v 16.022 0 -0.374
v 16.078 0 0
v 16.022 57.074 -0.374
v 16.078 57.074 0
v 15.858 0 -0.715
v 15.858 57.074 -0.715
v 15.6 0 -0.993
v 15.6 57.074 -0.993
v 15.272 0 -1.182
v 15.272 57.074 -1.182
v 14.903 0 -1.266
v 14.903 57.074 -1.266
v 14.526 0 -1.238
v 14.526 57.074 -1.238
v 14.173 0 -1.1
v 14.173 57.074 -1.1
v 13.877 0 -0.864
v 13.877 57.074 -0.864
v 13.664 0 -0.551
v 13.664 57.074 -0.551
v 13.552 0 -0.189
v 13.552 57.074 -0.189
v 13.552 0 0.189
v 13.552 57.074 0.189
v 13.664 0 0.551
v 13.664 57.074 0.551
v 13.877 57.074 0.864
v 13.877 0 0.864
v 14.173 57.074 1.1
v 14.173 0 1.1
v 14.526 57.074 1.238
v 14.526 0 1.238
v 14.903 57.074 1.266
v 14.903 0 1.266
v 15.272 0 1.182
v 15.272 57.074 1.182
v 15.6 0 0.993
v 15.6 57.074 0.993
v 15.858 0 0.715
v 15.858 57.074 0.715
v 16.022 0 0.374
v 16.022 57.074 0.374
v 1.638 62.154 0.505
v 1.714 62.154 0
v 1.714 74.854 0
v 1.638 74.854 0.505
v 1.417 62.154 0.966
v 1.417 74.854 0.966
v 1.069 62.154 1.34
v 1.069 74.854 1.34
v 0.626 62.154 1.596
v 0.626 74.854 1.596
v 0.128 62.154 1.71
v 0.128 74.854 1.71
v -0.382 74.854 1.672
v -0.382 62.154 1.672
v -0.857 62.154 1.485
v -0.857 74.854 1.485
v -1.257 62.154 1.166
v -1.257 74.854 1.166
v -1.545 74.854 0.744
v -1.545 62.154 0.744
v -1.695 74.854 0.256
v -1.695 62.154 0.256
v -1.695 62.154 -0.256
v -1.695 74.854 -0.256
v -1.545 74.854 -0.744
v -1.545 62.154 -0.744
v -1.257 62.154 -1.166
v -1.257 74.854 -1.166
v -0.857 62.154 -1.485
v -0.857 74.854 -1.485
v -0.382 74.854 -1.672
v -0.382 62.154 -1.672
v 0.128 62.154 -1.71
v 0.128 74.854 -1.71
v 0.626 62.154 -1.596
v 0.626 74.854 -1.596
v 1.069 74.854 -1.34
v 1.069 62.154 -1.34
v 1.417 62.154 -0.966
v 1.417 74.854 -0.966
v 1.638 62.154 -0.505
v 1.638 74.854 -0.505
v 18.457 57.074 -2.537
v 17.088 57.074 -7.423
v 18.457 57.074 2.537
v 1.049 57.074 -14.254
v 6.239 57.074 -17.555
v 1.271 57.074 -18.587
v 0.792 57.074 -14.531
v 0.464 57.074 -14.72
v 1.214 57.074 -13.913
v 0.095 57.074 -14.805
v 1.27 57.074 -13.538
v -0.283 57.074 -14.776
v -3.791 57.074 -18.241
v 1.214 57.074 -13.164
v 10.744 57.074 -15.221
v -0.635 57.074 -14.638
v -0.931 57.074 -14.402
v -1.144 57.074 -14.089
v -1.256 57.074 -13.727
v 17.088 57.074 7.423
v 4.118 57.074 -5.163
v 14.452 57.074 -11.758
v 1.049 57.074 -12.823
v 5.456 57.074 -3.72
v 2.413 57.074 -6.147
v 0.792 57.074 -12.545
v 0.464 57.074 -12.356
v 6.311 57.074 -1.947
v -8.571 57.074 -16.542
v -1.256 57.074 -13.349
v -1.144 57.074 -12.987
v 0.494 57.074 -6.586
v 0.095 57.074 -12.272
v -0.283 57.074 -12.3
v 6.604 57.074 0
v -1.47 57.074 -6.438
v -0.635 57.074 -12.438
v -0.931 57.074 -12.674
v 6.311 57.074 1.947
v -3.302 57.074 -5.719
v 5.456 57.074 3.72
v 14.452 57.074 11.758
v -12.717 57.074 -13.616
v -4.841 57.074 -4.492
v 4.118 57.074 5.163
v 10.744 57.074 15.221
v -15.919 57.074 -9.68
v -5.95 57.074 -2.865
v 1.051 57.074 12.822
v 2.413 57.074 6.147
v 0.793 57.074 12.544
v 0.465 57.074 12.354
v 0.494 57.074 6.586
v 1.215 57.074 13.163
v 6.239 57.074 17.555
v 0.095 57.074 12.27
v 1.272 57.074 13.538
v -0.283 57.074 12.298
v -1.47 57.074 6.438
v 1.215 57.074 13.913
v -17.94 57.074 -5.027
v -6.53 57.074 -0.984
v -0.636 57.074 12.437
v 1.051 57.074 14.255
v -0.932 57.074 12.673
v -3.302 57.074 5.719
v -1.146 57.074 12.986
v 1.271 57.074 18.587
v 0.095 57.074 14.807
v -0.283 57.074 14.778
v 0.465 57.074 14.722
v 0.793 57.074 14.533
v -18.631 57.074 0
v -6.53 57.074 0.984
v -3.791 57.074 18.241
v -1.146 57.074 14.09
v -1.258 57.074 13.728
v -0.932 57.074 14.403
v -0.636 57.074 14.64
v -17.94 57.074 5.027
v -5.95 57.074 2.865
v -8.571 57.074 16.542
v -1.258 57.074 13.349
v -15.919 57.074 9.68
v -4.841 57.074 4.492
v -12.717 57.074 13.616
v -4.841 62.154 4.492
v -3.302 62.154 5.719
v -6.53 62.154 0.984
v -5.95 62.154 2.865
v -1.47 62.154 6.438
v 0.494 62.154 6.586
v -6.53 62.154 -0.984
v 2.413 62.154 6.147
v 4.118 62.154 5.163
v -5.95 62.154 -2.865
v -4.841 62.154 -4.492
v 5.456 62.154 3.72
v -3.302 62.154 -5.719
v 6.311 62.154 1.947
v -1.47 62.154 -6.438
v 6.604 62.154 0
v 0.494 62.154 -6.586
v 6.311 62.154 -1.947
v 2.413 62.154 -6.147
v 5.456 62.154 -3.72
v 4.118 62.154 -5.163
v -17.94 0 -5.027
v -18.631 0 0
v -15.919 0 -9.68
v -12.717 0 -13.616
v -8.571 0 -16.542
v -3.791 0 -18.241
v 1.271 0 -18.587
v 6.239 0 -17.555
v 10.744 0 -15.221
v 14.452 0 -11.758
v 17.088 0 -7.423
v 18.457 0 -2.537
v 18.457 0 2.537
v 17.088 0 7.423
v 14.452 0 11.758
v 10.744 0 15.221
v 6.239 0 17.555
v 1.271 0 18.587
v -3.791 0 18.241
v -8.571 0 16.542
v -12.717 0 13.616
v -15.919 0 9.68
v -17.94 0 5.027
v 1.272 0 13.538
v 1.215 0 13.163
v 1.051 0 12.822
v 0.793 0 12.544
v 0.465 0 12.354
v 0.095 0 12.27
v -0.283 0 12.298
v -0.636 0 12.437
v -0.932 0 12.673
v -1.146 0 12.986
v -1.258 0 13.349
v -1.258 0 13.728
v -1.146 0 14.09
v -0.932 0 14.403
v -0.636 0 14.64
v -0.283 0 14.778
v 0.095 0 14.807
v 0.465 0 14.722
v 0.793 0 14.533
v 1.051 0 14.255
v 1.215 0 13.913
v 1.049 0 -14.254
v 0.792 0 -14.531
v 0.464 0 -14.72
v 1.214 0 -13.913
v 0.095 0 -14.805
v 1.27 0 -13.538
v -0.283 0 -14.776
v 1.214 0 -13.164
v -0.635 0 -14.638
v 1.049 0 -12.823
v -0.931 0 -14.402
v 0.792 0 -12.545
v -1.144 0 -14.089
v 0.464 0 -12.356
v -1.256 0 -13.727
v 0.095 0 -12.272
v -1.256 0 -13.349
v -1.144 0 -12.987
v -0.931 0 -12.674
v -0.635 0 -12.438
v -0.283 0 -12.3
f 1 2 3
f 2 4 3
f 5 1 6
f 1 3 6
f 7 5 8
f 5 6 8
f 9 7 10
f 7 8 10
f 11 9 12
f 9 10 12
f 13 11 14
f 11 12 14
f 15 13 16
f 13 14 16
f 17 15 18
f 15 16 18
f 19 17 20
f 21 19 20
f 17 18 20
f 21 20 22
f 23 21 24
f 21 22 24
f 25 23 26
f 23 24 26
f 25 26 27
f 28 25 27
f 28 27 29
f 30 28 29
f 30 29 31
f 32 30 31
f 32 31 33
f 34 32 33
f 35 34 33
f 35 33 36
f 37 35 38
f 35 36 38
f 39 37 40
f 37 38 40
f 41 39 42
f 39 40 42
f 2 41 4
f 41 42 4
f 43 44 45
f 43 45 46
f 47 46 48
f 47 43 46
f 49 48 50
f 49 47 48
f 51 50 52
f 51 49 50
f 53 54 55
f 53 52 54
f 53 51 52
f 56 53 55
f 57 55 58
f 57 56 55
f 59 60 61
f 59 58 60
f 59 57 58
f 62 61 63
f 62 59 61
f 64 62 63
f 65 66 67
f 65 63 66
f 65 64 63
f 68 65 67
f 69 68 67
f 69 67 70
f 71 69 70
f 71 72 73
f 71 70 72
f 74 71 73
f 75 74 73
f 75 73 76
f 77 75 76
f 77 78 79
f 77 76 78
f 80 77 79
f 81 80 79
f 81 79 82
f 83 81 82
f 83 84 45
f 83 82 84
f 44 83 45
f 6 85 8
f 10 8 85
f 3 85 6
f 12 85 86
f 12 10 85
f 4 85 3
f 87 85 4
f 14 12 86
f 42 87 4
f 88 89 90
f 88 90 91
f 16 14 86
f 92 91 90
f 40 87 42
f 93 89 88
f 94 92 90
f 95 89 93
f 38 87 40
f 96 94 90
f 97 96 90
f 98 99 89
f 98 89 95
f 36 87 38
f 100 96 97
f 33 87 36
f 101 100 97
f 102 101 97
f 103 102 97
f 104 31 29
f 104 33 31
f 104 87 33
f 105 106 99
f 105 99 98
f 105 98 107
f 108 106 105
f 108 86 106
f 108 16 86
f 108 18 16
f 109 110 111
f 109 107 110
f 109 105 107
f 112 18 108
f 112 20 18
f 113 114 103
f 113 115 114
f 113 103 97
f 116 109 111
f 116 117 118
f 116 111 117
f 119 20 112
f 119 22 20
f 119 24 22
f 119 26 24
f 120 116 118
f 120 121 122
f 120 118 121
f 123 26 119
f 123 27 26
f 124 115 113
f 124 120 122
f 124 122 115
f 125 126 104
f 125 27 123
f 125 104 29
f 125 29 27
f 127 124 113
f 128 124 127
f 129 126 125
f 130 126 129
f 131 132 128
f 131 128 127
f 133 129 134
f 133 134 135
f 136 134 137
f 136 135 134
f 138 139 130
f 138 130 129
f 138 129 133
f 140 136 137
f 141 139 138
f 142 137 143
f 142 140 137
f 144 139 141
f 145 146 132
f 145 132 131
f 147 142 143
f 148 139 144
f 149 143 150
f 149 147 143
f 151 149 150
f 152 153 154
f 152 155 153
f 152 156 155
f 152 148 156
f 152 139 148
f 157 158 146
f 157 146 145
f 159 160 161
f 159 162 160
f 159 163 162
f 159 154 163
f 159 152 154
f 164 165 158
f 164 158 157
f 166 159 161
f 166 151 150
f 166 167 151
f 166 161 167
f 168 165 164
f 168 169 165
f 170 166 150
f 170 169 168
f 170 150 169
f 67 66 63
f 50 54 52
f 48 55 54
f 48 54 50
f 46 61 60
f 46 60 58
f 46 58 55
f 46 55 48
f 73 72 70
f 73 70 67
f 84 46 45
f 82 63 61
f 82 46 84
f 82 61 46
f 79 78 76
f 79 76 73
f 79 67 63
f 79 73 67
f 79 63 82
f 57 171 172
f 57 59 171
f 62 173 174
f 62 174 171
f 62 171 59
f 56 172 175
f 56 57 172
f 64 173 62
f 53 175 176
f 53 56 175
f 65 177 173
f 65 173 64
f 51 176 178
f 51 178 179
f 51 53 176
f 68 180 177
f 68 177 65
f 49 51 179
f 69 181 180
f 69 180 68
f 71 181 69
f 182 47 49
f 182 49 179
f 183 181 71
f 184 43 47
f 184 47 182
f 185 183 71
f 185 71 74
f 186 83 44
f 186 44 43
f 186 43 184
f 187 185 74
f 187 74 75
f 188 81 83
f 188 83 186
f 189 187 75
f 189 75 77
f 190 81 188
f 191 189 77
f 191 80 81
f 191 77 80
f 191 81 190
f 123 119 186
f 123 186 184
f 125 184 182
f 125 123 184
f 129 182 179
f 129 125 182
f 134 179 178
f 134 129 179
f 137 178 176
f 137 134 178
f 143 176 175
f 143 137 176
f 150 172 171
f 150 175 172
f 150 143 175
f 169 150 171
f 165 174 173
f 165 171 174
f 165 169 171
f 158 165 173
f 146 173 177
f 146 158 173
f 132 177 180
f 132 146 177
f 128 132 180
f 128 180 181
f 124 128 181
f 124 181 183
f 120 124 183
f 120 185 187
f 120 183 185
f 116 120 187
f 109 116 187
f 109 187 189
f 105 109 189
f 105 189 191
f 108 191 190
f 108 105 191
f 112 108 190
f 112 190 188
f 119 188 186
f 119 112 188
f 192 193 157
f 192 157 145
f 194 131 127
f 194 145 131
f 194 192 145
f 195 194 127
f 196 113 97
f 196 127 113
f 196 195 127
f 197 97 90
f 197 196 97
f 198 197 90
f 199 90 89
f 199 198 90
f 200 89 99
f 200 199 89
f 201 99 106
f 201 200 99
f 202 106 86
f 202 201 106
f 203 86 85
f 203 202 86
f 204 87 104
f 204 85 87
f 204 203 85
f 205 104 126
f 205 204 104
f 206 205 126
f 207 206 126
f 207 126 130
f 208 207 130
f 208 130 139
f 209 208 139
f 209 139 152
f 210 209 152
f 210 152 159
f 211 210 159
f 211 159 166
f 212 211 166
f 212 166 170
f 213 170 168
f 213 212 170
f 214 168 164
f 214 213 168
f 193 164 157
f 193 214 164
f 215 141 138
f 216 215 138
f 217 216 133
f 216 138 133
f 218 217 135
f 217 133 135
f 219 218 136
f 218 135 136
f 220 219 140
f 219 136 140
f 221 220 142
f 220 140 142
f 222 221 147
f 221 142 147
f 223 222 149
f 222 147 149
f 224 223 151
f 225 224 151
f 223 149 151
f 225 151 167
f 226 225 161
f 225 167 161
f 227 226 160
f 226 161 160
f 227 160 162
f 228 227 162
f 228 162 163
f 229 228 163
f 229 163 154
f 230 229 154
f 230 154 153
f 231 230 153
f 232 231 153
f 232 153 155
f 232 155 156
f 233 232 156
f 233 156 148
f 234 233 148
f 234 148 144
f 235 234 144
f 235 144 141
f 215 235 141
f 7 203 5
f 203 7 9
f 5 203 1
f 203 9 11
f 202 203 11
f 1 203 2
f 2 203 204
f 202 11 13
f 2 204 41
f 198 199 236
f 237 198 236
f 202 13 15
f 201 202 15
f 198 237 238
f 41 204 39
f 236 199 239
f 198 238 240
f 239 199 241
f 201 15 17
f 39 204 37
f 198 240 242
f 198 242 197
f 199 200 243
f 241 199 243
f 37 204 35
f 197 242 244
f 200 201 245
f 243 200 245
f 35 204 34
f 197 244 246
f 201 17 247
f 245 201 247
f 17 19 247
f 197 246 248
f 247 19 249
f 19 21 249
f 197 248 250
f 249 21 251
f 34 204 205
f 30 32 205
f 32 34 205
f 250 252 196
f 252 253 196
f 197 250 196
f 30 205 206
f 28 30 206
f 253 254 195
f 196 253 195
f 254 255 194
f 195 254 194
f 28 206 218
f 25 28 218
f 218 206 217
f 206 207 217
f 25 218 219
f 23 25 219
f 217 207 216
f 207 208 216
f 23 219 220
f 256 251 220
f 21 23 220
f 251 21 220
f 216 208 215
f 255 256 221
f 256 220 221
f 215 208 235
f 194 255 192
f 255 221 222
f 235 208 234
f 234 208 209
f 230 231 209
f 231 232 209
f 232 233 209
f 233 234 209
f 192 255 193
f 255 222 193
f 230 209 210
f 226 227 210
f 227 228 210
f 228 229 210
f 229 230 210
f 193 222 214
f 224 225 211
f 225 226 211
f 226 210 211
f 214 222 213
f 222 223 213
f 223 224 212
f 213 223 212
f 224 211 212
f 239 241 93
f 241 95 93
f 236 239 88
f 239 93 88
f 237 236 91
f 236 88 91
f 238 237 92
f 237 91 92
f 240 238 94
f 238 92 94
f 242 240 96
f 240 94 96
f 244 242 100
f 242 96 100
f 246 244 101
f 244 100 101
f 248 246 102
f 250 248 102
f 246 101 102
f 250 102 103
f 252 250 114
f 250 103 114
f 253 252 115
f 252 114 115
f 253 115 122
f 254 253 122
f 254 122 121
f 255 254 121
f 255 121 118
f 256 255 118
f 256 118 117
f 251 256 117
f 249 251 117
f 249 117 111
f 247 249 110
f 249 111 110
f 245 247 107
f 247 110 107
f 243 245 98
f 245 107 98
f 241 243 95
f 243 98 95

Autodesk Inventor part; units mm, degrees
ref_plane "YZ Plane" through (0, 0, 0) normal (1, 0, 0) x (0, 1, 0)
ref_plane "XZ Plane" through (0, 0, 0) normal (0, 1, 0) x (-1, 0, 0)
ref_plane "XY Plane" through (0, 0, 0) normal (0, 0, 1) x (1, 0, 0)
sketch "Sketch1" plane through (0, 0, 0) normal (0, 1, 0) x (-1, 0, 0)
  circle A0 centre (0, 0) radius 18.6309
  dimension "d0" = 37.2618
extrude "Extrusion1" add sketch "Sketch1" along normal blind 57.0738
sketch "Sketch2" plane through (0, 57.0738, 0) normal (0, 1, 0) x (1, 0, 0)
  circle A0 centre (0, 0) radius 6.604
  dimension "d3" = 13.208
extrude "Extrusion2" add sketch "Sketch2" along normal blind 5.08
sketch "Sketch3" plane through (0, 57.0738, 0) normal (0, 1, 0) x (1, 0, 0)
  circle A0 centre (0, 13.5382) radius 1.27
  circle A1 centre (0, -13.5382) radius 1.2719
  circle A2 centre (14.8082, 0) radius 1.27
  point P0 (0, 0)
  dimension "d6" = 2.54
  dimension "d7" = 2.54
  dimension "d8" = 13.5382
  dimension "d9" = 13.5382
  dimension "d10" = 14.8082
extrude "Extrusion3" cut sketch "Sketch3" against normal blind 76.2
sketch "Sketch4" plane through (0, 62.1538, 0) normal (0, 1, 0) x (1, 0, 0)
  circle A0 centre (0, 0) radius 1.7145
  dimension "d13" = 3.429
extrude "Extrusion4" add sketch "Sketch4" along normal blind 12.7
sketch "Sketch5" plane through (0, 74.8538, 0) normal (0, 1, 0) x (1, 0, 0)
  point P0 (0, 0)
properties part number "motor MABCHI 3W Noah"
